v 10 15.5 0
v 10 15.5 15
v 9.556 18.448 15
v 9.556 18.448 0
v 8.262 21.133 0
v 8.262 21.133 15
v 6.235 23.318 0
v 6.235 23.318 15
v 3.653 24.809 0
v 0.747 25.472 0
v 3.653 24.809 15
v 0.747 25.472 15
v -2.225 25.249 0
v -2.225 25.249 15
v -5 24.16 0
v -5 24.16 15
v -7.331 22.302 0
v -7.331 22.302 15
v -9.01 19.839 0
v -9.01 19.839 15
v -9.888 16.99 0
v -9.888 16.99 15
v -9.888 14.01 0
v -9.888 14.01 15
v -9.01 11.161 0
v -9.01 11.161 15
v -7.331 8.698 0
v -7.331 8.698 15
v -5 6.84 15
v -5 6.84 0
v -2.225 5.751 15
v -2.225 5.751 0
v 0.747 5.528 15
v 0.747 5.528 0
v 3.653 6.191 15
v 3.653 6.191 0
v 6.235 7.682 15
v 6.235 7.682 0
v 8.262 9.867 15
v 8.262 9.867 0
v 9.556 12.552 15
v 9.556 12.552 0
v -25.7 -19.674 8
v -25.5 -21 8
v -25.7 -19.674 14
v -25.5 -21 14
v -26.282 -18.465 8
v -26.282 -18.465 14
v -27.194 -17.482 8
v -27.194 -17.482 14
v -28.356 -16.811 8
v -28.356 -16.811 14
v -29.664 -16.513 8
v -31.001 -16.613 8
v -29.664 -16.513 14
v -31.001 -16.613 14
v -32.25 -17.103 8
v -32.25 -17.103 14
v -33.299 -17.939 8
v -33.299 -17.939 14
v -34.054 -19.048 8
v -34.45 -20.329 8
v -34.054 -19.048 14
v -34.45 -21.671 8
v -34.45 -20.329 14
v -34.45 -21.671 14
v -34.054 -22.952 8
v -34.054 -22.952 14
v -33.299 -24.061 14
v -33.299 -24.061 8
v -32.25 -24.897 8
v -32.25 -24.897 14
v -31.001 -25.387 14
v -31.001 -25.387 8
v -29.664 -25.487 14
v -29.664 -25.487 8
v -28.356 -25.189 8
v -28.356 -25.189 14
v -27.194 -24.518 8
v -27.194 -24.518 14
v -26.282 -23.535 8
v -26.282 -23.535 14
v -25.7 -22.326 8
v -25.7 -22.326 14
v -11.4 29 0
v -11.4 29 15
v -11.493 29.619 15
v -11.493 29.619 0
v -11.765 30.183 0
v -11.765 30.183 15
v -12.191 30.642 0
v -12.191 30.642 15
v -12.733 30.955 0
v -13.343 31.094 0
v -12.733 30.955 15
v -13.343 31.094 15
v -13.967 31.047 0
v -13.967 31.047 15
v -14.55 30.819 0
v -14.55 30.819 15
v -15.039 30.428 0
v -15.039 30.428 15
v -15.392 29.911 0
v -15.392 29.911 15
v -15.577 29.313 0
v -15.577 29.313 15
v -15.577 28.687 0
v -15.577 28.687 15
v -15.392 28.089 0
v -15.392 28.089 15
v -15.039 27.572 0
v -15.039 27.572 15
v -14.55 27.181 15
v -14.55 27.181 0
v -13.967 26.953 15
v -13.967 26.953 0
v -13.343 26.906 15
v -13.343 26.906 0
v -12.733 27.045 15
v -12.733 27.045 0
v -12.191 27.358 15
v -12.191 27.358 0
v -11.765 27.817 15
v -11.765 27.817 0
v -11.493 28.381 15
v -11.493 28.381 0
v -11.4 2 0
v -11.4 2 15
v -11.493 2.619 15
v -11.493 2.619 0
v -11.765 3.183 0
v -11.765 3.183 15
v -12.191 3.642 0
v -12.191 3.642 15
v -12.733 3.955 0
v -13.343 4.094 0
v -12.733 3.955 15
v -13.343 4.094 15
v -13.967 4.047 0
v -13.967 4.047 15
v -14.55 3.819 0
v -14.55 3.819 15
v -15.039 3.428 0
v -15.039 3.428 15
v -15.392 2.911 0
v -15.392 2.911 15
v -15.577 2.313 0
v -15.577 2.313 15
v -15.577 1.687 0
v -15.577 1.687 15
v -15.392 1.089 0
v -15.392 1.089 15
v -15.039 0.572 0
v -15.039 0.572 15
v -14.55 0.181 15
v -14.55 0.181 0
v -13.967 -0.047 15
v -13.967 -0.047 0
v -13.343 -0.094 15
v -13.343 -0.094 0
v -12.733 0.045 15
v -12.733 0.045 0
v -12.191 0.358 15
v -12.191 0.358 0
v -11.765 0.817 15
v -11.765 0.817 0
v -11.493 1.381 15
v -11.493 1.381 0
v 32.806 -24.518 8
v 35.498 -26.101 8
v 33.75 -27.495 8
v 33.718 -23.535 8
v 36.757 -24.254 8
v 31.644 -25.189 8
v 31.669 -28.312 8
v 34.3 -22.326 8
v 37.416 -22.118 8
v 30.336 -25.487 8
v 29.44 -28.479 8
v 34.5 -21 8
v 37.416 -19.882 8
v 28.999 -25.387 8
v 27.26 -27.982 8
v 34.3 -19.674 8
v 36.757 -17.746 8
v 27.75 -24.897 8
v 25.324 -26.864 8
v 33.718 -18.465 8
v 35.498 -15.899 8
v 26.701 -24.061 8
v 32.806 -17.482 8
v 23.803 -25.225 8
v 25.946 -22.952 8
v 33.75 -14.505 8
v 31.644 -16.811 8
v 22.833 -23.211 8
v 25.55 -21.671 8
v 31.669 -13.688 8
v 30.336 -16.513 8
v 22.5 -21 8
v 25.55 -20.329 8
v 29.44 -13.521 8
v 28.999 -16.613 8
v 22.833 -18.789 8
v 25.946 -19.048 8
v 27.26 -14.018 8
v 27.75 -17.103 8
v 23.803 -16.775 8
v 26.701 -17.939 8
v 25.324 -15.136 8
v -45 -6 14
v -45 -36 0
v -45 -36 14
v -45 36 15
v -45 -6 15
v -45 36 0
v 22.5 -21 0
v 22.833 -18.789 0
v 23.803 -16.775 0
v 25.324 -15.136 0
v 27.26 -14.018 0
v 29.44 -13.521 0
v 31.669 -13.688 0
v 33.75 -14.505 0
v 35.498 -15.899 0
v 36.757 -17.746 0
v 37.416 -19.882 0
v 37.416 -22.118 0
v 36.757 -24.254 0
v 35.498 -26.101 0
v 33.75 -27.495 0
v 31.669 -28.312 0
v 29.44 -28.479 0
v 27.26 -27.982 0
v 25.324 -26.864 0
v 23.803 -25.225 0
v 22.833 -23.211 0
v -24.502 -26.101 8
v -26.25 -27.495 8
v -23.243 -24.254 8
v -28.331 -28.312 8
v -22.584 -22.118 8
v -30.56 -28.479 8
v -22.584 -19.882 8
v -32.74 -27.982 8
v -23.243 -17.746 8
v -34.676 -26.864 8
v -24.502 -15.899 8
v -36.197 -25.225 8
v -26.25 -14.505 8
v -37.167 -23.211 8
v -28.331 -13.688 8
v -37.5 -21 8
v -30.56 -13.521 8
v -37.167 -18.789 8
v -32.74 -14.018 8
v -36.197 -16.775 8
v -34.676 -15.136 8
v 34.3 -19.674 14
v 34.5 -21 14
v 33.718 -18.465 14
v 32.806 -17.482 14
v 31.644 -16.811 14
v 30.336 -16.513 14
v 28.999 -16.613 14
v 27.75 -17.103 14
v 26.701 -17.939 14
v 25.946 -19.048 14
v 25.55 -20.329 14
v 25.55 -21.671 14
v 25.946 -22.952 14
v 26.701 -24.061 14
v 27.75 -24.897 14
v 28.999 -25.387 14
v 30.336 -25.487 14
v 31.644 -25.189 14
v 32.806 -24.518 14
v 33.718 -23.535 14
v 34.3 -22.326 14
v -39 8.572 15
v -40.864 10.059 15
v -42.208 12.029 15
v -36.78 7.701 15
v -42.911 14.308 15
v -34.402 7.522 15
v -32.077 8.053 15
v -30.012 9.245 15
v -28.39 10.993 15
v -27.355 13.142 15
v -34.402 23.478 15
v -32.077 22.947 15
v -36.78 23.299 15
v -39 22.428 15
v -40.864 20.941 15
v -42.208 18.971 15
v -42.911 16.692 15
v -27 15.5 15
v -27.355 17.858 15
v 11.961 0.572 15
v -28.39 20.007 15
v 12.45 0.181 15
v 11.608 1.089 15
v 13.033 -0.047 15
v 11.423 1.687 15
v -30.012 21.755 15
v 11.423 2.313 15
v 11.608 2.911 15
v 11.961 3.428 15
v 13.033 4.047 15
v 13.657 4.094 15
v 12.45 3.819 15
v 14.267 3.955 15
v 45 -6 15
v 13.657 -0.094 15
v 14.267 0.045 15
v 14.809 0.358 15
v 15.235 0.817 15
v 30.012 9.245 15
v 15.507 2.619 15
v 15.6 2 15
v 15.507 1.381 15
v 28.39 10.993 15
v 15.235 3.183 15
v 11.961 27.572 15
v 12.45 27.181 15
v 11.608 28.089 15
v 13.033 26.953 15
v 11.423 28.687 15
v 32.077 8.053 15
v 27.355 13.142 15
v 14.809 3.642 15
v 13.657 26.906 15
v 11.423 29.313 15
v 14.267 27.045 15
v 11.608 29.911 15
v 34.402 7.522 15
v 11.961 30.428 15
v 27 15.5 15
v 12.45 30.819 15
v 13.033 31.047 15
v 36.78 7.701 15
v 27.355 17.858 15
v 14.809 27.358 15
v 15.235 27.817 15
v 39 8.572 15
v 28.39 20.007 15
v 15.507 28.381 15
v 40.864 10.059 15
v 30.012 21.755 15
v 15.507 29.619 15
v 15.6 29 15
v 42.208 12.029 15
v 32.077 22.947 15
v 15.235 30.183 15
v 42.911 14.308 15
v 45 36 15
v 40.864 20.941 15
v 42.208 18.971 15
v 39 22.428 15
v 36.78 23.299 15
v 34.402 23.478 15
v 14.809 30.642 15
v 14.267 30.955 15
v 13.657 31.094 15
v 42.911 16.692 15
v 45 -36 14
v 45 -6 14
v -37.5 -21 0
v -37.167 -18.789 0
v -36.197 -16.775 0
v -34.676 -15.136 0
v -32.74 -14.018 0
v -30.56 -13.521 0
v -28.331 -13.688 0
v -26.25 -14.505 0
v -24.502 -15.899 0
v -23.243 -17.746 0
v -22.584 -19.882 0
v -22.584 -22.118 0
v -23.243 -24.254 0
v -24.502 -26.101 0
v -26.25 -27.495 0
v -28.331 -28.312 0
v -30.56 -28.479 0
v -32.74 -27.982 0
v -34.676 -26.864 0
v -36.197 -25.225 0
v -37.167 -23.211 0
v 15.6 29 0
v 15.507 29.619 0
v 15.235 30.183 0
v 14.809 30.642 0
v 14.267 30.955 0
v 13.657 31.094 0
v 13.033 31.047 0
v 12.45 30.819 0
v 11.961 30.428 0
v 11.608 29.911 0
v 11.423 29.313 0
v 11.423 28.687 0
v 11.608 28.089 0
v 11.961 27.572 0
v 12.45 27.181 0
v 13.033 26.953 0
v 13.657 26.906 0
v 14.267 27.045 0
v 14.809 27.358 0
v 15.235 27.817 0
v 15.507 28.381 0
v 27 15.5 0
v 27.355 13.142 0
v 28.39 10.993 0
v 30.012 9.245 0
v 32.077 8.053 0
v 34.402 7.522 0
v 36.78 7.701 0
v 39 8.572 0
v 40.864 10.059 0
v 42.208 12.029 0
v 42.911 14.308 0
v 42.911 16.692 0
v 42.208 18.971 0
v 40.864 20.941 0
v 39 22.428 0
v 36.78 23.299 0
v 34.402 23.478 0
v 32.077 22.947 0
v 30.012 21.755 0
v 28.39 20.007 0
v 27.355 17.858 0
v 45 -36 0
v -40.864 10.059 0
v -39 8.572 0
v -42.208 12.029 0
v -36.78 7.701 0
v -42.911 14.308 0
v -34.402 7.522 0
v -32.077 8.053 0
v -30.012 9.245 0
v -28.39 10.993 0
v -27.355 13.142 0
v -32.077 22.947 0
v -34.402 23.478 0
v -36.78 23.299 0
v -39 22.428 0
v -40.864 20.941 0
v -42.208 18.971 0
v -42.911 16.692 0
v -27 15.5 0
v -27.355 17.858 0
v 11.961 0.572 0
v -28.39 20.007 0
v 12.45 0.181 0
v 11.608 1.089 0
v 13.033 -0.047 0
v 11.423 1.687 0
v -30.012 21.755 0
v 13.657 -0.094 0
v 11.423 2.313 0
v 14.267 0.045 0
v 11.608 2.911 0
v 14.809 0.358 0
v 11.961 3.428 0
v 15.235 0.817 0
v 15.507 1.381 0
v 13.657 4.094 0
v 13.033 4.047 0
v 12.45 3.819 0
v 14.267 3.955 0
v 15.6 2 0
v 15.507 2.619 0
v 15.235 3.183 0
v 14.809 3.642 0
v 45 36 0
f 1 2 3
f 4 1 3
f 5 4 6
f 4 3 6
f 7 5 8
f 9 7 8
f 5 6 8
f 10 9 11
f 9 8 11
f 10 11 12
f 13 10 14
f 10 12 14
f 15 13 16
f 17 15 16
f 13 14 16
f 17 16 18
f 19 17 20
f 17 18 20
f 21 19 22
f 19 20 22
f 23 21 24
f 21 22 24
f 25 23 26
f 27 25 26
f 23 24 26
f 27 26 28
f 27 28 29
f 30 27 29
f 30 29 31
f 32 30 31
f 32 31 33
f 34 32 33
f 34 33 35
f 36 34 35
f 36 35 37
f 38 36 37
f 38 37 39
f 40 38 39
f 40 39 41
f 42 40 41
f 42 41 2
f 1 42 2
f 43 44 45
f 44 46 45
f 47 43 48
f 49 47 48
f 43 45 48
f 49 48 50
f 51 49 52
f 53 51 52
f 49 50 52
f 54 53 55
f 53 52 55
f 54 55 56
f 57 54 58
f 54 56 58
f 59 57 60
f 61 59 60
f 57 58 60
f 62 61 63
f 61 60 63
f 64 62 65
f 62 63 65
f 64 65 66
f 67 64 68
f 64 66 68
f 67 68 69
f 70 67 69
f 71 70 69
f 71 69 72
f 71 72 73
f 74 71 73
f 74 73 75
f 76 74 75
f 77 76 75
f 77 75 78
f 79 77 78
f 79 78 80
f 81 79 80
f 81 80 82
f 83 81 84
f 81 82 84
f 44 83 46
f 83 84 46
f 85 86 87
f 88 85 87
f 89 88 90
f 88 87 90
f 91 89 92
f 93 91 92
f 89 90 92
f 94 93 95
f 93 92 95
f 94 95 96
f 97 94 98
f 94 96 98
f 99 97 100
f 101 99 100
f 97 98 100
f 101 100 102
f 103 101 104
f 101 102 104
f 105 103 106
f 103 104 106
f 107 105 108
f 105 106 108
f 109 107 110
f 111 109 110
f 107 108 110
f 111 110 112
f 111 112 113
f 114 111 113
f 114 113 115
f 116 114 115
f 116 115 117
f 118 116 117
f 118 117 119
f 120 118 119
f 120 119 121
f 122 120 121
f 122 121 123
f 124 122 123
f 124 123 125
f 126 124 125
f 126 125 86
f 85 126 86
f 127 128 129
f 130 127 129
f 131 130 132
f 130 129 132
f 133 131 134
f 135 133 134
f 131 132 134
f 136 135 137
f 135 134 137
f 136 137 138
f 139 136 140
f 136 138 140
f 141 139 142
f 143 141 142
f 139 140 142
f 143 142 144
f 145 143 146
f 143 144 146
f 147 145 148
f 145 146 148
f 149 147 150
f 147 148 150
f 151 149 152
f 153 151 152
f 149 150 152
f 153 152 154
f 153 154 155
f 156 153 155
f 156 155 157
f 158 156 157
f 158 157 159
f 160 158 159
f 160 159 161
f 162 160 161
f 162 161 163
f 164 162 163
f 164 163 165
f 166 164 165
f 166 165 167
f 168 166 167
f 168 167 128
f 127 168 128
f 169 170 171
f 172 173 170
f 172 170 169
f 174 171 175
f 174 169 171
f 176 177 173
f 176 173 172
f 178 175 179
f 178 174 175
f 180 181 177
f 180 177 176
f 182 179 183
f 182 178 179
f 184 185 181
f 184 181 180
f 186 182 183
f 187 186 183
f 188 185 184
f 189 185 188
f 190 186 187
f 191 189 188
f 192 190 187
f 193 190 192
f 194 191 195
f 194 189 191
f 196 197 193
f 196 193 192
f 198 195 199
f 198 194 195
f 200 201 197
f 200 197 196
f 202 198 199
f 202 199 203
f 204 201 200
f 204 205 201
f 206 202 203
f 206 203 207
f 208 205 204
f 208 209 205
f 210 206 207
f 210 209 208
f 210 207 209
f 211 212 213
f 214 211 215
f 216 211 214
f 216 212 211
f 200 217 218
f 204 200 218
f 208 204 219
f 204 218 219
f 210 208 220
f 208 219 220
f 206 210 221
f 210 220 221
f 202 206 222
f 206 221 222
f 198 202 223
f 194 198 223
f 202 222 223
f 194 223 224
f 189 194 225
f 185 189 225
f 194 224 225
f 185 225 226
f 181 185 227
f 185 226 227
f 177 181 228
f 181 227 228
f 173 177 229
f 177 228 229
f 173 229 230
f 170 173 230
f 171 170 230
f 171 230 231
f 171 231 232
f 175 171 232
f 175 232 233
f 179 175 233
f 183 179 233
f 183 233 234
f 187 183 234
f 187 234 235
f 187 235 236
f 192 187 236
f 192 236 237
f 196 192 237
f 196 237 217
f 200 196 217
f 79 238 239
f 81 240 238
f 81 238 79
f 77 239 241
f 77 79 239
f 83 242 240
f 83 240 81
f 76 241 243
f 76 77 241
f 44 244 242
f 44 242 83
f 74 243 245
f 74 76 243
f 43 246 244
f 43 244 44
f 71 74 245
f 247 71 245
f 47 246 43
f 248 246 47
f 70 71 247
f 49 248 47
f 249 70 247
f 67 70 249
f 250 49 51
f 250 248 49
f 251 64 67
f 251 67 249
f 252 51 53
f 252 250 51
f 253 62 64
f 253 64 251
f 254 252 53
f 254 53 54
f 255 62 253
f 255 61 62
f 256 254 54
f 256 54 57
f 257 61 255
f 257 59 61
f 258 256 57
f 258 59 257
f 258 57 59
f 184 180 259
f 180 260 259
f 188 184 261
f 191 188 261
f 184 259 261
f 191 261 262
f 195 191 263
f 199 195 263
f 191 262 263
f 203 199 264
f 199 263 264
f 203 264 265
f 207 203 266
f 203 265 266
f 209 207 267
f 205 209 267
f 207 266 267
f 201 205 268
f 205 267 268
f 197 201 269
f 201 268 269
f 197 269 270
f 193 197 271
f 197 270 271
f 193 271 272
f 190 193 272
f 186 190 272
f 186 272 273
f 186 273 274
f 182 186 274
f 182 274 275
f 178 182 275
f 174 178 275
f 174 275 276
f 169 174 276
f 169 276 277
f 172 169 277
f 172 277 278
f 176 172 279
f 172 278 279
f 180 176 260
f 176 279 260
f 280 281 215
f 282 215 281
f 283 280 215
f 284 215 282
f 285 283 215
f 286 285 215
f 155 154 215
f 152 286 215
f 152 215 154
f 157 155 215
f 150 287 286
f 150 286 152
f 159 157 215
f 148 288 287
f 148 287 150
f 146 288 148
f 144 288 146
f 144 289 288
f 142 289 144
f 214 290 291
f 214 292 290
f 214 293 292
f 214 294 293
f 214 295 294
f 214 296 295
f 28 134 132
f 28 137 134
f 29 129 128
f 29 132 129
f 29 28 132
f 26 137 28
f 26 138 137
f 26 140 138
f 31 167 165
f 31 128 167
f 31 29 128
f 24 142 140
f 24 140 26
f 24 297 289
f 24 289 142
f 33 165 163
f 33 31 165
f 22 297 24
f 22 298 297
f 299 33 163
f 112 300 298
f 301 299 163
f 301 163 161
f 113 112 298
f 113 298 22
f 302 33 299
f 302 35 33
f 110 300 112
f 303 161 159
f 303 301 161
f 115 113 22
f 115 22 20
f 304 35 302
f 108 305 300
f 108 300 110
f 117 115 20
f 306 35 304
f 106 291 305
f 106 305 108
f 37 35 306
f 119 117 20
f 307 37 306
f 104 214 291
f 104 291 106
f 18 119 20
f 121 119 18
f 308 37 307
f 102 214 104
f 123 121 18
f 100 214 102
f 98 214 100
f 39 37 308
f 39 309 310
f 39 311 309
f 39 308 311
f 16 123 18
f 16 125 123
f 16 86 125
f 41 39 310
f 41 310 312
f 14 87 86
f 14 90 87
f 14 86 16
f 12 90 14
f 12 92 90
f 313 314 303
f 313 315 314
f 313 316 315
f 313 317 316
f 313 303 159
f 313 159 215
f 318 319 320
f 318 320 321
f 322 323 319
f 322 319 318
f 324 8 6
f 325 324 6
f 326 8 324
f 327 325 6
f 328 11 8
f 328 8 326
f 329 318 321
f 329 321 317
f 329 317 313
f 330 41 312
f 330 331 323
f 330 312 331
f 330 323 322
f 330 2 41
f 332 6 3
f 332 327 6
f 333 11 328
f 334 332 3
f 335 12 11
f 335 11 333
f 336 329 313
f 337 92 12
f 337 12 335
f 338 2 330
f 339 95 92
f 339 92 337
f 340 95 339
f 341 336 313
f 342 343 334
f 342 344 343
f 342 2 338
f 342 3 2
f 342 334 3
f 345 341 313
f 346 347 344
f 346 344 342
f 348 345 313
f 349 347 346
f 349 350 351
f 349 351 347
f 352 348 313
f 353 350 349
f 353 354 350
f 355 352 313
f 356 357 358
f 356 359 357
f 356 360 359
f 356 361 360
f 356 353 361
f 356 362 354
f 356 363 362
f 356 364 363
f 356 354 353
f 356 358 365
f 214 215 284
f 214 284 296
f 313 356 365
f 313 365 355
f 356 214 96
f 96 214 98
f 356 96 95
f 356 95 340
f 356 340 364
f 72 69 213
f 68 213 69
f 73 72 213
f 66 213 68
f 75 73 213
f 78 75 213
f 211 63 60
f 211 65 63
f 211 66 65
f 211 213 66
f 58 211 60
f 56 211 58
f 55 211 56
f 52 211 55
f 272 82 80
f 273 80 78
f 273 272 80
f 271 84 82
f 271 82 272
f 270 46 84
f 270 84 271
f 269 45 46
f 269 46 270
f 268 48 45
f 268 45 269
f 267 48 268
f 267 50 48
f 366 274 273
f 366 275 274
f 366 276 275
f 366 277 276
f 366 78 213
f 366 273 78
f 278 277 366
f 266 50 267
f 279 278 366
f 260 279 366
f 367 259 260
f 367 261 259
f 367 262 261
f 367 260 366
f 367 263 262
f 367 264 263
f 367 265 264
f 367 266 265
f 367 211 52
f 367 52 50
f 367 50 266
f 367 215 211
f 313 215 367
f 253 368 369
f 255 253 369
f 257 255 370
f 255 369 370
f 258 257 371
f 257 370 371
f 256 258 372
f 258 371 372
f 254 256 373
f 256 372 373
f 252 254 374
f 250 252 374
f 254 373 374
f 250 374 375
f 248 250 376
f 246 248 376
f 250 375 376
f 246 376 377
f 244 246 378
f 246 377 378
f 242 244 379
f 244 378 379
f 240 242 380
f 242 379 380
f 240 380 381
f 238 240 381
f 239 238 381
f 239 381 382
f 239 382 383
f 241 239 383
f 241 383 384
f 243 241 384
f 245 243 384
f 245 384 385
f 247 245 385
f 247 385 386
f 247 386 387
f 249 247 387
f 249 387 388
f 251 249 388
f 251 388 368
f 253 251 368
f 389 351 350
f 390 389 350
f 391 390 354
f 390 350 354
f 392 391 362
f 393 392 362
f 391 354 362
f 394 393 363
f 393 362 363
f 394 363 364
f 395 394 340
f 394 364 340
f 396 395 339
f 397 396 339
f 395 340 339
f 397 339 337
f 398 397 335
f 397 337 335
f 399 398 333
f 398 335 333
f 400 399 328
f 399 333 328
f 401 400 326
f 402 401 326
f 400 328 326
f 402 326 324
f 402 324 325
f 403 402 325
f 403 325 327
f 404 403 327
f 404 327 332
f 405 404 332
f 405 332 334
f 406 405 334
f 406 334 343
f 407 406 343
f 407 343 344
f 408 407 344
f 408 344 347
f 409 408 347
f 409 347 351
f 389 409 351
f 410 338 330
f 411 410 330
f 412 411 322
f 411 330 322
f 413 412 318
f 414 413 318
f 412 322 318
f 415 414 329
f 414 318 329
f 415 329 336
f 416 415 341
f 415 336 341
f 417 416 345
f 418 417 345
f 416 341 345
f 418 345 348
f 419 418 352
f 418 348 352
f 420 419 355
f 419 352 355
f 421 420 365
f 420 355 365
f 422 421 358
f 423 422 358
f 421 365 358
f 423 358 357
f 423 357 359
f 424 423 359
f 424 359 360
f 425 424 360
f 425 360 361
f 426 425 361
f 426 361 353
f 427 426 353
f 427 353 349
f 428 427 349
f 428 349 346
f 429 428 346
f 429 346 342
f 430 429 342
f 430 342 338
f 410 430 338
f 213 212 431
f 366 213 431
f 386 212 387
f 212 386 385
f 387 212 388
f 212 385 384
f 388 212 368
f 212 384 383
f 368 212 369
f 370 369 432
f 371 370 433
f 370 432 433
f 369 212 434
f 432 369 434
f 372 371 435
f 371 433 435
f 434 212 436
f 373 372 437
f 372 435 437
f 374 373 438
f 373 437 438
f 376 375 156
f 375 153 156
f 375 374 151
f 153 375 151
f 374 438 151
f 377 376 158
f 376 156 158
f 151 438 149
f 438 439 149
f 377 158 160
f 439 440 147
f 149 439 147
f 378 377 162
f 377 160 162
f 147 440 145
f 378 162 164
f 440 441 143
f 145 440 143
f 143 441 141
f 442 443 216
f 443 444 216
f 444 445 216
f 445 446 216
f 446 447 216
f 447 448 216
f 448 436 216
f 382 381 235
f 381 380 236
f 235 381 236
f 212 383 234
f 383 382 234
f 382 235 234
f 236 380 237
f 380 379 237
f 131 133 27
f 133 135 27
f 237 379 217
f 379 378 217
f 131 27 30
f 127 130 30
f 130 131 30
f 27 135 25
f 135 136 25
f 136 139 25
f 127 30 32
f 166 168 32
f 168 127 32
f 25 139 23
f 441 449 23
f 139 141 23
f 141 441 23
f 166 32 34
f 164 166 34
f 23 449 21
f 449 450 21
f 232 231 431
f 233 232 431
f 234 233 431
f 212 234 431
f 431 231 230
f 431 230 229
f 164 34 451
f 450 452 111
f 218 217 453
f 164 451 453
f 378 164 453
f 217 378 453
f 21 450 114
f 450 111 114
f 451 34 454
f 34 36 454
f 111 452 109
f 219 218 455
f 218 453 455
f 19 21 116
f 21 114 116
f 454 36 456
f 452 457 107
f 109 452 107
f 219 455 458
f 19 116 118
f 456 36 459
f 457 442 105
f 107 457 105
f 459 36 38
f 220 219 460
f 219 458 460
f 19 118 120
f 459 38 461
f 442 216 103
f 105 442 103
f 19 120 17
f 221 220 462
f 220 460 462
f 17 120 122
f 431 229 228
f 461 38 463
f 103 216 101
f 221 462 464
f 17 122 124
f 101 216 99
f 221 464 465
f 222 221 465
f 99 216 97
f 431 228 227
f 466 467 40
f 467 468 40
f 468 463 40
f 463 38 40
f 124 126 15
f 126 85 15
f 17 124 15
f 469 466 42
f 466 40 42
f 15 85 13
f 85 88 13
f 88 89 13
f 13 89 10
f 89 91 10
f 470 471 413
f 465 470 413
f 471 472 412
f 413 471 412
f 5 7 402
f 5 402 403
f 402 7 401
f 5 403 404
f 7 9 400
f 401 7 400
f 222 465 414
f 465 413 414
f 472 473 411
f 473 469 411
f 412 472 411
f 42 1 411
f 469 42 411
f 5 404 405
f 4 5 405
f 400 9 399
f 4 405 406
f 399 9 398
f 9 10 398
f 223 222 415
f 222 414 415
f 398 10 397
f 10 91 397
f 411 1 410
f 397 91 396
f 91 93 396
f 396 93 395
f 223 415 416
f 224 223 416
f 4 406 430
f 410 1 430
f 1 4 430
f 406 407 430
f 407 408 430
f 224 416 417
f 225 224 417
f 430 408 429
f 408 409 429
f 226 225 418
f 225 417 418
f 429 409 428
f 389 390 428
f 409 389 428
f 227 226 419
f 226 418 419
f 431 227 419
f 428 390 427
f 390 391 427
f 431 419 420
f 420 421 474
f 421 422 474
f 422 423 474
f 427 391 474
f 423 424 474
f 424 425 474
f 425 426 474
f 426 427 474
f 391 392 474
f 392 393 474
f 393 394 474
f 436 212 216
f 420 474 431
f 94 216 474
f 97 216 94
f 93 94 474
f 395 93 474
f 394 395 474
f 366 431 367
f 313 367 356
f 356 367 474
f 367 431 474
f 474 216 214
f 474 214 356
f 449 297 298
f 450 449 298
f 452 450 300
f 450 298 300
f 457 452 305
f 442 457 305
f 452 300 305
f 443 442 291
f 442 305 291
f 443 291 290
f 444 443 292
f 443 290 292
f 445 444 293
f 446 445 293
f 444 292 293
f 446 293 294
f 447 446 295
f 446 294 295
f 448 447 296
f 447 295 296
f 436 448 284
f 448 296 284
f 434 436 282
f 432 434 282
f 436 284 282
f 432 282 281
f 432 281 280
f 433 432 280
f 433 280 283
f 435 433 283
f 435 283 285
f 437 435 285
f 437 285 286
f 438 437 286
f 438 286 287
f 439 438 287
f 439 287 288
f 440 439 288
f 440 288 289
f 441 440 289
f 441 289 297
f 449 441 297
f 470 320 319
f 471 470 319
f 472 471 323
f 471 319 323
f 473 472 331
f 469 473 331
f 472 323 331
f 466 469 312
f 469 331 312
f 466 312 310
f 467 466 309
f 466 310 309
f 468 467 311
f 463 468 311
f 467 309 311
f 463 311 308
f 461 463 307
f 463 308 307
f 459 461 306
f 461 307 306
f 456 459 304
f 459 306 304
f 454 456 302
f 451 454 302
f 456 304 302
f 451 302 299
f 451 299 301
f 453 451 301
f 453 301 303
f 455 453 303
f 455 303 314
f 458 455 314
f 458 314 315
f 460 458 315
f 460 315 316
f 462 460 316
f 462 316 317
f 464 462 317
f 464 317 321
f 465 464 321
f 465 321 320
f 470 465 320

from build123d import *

# Parameters (mm, degrees)
SKETCH1_W                      = 90
SKETCH1_H                      = 72
BOSS_EXTRUDE1_DEPTH            = 15
SKETCH2_W                      = 90
SKETCH2_H                      = 30
CUT_EXTRUDE1_DEPTH             = 1
SKETCH4_R                      = 10
SKETCH4_R_2                    = 8
CUT_EXTRUDE3_DEPTH             = 60.548299724
CBORE_FOR_M8_SHCS1_D           = 9
CBORE_FOR_M8_SHCS1_DEPTH       = 15
CBORE_FOR_M8_SHCS1_CBORE_D     = 15
CBORE_FOR_M8_SHCS1_CBORE_DEPTH = 8
CBORE_FOR_M8_SHCS1_TIP         = 2.703872786
M5X0_8_TAPPED_HOLE1_D          = 4.2


with BuildPart() as part:
    # Sketch1 → Boss-Extrude1 (new body)
    with BuildSketch(Plane.XY):
        Rectangle(SKETCH1_W, SKETCH1_H)
    extrude(amount=BOSS_EXTRUDE1_DEPTH)

    # Sketch2 → Cut-Extrude1 (cut)
    with BuildSketch(Plane.XY.offset(15)):
        with Locations((0, -21)):
            Rectangle(SKETCH2_W, SKETCH2_H)
    extrude(amount=-CUT_EXTRUDE1_DEPTH, mode=Mode.SUBTRACT)

    # Sketch4 → Cut-Extrude3 (cut, through all)
    with BuildSketch(Plane.XY.offset(15)):
        with Locations((0, 15.5)):
            Circle(SKETCH4_R)
        with Locations((-35, 15.5)):
            Circle(SKETCH4_R_2)
        with Locations(Location((35, 15.5, 0), (0, 0, 180))):
            Circle(SKETCH4_R_2)
    extrude(amount=-CUT_EXTRUDE3_DEPTH, mode=Mode.SUBTRACT)

    # CBORE for M8 SHCS1
    with Locations(Plane(origin=(0, 0, 0), x_dir=(-1, 0, 0), z_dir=(0, 0, -1))):
        with Locations((30, -21), (-30, -21)):
            CounterBoreHole(CBORE_FOR_M8_SHCS1_D / 2, CBORE_FOR_M8_SHCS1_CBORE_D / 2, CBORE_FOR_M8_SHCS1_CBORE_DEPTH, depth=CBORE_FOR_M8_SHCS1_DEPTH)
            with Locations((0, 0, -(CBORE_FOR_M8_SHCS1_DEPTH + CBORE_FOR_M8_SHCS1_TIP / 2))):  # 118° drill point
                Cone(0, CBORE_FOR_M8_SHCS1_D / 2, CBORE_FOR_M8_SHCS1_TIP, mode=Mode.SUBTRACT)

    # M5x0.8 Tapped Hole1 (through all)
    with Locations(Plane(origin=(0, 0, 0), x_dir=(-1, 0, 0), z_dir=(0, 0, -1))):
        with Locations((13.5, 2), (13.5, 29), (-13.5, 29), (-13.5, 2)):
            Hole(M5X0_8_TAPPED_HOLE1_D / 2)


solid = part.part
